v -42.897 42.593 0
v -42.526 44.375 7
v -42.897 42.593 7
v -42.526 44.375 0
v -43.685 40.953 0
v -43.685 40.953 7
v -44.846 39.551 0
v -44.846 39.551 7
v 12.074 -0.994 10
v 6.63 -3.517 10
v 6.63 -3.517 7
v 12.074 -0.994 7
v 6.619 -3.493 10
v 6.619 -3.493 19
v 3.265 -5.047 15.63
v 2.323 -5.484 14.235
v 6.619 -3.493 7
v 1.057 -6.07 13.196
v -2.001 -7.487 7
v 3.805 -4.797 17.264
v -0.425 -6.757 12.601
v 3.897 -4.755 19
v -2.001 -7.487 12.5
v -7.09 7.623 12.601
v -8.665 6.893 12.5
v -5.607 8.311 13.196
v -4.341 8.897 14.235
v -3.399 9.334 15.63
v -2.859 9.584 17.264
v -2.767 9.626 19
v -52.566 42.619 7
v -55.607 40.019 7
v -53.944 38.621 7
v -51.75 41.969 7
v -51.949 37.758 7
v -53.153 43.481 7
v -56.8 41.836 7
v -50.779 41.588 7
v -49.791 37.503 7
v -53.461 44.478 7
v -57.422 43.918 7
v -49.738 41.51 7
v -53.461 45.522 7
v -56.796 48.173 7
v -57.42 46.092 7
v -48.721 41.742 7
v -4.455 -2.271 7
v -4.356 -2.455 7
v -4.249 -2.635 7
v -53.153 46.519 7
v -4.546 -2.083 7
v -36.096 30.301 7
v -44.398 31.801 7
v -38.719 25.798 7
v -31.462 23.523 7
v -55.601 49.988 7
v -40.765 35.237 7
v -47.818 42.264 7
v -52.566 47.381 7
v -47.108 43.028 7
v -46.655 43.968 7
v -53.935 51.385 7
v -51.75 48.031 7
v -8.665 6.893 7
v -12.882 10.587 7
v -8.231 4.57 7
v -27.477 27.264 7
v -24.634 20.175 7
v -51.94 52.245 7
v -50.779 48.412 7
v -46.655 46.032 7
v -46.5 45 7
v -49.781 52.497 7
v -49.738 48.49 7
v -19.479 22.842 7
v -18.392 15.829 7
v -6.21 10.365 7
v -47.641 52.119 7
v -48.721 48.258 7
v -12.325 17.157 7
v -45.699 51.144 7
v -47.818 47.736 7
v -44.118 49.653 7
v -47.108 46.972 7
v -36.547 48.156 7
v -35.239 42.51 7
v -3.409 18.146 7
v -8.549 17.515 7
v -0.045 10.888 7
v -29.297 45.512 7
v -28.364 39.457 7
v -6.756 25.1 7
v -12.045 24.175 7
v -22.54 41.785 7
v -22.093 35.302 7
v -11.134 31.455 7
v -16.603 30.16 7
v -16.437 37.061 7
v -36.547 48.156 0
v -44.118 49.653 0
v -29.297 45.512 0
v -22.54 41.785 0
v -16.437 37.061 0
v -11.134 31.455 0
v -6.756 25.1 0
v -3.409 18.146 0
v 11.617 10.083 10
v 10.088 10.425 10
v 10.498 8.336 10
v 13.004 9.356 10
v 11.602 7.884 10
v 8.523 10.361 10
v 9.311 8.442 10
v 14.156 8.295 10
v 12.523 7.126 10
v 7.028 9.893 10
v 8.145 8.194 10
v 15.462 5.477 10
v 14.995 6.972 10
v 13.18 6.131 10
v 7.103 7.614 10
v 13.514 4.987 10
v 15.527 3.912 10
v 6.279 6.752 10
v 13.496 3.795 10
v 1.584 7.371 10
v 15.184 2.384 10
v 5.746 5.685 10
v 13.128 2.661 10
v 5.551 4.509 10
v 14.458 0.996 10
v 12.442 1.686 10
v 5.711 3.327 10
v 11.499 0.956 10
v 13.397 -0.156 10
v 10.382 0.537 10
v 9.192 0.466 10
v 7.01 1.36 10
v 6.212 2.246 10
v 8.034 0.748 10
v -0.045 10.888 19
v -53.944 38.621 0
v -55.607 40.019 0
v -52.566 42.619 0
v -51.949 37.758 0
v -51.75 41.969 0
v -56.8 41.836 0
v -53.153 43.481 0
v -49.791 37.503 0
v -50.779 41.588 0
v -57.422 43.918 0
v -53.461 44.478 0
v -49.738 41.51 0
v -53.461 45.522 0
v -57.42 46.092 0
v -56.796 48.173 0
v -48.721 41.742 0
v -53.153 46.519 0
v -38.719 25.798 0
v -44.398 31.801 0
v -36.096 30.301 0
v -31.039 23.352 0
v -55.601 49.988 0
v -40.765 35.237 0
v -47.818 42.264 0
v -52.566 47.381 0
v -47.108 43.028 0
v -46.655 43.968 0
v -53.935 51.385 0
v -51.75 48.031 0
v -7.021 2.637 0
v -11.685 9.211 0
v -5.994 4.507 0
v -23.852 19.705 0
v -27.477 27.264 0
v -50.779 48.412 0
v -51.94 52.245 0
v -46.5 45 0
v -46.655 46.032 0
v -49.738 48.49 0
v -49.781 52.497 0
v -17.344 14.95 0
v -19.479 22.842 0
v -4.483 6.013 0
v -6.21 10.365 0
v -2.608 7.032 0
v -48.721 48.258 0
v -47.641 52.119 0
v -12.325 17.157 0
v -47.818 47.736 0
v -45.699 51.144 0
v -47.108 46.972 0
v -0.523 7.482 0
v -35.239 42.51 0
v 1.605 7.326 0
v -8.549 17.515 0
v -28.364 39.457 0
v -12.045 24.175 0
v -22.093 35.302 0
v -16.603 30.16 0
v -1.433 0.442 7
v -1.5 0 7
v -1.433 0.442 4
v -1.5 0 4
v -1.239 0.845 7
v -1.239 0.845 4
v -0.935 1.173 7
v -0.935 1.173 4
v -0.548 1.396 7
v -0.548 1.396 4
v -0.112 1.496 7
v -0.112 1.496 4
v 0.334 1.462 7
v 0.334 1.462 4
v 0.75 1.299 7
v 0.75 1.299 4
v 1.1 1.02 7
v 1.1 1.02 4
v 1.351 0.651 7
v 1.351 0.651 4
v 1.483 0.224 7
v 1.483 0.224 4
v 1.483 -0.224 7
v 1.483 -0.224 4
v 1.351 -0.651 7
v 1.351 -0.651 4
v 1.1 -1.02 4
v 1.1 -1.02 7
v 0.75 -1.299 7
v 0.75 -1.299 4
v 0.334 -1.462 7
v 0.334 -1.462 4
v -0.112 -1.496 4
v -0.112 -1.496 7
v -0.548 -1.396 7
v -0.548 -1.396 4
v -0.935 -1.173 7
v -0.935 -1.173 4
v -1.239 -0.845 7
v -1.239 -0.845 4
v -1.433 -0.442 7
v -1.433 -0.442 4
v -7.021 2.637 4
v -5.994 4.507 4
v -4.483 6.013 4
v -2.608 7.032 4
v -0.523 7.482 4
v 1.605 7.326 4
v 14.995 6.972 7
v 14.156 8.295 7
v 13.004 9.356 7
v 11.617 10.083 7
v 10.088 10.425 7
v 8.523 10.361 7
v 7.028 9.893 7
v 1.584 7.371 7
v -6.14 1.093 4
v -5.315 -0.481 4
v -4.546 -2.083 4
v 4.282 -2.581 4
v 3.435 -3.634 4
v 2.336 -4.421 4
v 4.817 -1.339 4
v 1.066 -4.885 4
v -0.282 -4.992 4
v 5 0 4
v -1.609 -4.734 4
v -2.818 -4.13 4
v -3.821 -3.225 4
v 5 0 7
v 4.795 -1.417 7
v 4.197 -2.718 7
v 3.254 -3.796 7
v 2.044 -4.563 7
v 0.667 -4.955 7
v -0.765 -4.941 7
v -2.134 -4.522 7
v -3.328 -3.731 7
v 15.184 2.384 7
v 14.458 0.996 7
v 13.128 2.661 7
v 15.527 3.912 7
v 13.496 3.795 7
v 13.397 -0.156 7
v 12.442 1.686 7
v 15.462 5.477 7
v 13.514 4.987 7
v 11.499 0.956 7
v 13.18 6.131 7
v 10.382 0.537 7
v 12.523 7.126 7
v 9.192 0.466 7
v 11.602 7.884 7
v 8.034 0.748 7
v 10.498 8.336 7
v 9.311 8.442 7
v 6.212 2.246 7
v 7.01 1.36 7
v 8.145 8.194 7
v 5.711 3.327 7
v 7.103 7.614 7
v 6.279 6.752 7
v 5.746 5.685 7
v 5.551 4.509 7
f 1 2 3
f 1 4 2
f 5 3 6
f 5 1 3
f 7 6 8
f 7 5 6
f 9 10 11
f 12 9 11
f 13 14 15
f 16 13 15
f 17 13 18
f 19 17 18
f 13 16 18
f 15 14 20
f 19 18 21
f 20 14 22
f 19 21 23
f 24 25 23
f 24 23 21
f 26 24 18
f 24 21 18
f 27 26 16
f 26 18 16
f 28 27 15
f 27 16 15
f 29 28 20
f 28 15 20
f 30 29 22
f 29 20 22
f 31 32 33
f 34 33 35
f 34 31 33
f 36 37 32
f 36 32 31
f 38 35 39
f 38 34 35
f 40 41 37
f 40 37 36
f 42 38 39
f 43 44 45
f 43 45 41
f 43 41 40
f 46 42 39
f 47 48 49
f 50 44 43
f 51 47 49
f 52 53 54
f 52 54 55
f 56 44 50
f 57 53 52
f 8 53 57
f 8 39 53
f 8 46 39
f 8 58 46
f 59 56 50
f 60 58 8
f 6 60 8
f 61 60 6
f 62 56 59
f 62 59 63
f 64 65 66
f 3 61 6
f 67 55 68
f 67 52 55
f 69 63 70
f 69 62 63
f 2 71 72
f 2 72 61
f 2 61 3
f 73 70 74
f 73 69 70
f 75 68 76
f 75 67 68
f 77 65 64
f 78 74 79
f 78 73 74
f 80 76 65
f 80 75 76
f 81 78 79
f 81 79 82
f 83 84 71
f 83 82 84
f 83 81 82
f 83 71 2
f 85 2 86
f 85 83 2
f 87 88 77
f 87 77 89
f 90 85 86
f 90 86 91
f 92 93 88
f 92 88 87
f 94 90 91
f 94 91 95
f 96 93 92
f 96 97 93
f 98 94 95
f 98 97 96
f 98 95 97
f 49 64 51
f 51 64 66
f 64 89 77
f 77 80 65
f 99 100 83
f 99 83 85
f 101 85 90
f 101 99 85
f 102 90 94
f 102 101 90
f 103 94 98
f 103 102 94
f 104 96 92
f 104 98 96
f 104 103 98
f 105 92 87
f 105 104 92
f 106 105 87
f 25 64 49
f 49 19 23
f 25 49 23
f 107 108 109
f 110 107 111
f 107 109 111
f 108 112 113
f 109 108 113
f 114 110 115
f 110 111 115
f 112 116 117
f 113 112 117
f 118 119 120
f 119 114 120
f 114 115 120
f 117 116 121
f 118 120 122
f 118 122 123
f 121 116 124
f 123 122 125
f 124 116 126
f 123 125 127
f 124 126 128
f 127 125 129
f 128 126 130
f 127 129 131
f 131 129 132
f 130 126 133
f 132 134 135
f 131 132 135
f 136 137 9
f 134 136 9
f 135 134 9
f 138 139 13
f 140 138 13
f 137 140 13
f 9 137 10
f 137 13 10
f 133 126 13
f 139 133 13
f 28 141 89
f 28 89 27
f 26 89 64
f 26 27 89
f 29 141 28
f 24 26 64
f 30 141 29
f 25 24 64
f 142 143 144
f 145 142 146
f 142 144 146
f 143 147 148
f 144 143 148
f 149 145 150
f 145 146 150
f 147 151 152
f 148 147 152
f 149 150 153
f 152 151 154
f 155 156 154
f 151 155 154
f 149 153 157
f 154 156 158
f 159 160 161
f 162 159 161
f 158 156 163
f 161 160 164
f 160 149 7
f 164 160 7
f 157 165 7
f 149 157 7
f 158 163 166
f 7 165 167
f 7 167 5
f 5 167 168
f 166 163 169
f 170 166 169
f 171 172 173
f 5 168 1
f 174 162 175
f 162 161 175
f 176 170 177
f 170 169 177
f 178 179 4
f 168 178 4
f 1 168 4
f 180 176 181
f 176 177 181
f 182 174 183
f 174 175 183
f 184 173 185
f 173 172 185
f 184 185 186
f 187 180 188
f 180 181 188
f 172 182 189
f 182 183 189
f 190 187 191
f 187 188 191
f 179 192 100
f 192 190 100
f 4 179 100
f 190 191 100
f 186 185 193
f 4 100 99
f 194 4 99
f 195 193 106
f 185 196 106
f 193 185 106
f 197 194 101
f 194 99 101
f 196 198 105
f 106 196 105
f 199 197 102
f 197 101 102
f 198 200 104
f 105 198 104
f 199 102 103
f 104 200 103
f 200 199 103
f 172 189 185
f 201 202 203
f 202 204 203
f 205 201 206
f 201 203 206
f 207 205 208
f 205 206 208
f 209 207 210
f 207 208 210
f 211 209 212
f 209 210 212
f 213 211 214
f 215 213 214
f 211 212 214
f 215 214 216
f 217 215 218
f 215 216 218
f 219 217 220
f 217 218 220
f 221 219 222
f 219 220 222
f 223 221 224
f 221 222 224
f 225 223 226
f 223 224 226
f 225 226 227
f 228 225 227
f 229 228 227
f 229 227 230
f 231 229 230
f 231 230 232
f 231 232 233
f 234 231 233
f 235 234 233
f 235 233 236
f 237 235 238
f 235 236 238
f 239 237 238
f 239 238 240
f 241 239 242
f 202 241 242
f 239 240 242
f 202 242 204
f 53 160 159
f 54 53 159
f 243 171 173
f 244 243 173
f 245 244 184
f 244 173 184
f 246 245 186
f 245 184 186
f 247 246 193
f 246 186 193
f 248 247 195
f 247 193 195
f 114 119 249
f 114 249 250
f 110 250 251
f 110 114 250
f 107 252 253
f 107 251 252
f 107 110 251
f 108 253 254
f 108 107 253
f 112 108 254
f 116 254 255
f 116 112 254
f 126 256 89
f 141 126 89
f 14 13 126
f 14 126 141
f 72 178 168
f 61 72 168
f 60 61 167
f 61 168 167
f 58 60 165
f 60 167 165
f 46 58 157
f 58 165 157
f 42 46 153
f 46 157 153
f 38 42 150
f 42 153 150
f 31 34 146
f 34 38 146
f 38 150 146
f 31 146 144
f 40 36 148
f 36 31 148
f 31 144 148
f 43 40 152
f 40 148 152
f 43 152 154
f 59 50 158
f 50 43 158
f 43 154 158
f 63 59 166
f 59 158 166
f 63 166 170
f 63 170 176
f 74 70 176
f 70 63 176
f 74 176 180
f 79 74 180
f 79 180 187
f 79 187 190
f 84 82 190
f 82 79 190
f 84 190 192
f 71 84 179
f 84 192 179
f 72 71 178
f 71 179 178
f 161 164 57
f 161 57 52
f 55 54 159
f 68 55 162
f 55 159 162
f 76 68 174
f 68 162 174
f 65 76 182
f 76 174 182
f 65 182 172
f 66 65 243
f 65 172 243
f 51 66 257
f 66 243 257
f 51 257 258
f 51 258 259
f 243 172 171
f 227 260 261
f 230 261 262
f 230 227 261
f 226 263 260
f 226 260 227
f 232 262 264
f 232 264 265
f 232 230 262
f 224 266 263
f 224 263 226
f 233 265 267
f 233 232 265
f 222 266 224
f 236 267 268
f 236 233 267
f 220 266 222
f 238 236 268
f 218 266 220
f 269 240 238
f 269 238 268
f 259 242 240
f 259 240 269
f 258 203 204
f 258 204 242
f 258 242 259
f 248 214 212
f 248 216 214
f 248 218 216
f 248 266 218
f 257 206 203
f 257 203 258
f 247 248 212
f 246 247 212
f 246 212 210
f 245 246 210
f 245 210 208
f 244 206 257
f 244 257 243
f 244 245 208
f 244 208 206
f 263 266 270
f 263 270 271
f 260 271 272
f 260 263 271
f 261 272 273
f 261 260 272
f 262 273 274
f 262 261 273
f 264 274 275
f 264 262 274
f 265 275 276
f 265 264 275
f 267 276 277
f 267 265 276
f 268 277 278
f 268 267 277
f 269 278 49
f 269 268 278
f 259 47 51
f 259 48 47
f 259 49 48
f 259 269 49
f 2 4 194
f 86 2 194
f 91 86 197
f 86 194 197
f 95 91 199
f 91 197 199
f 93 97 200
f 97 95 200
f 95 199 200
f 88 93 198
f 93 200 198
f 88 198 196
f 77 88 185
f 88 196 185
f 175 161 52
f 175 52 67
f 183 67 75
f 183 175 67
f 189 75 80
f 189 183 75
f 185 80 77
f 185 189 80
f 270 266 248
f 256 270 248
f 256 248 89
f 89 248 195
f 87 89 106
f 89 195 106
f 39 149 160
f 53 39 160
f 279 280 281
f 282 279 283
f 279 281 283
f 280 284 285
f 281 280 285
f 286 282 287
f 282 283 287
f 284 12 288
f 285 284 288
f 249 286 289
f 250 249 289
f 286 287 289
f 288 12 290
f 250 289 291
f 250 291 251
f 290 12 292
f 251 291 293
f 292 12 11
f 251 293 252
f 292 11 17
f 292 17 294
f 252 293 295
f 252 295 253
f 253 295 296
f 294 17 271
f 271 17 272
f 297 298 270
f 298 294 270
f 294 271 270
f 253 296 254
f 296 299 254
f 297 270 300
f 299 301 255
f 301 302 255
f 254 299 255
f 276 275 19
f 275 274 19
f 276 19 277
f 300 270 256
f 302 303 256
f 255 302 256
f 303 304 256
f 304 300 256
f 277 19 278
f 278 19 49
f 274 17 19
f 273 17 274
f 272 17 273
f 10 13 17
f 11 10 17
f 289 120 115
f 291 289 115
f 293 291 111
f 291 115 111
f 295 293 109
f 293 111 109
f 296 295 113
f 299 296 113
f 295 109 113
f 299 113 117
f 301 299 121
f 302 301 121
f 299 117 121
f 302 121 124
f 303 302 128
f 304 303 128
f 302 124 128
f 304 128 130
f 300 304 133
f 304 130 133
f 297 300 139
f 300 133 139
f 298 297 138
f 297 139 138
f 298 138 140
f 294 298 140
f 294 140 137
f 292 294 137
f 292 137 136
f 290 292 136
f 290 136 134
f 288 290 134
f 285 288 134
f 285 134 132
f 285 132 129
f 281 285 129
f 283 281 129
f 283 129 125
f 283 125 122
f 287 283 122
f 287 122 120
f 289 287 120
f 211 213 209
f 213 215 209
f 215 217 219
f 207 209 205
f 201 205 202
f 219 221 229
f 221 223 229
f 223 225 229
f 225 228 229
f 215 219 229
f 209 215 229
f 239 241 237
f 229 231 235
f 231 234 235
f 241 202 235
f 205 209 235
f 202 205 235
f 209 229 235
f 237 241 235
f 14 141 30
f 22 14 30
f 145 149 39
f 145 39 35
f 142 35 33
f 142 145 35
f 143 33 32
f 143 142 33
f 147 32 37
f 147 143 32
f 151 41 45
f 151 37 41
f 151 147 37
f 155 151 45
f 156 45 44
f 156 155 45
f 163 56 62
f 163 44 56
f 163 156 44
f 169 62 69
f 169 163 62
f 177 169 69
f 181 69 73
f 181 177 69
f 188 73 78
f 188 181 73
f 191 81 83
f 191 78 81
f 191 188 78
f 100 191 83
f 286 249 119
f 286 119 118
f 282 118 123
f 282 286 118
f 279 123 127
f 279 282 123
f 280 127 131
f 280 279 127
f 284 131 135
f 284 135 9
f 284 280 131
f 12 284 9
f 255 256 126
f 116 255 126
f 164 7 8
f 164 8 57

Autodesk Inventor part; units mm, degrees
ref_plane "YZ Plane" through (0, 0, 0) normal (1, 0, 0) x (0, 1, 0)
ref_plane "XZ Plane" through (0, 0, 0) normal (0, 1, 0) x (-1, 0, 0)
sketch "Sketch1" plane through (0, 0, 0) normal (0, 0, 1) x (1, 0, 0)
  arc A0 (-3.4091, 18.1463) -> (-44.1177, 49.6528) centre (-50, 0) ccw
  arc A1 (-4.5455, -2.083) -> (-38.7191, 25.7979) centre (-50, -22.9129) ccw
  arc A2 (-6.2101, 10.3653) -> (-42.5261, 44.375) centre (-50, 0) ccw
  line L0 (5, 0) -> (-3.4091, 18.1463)
  arc A3 (-4.5455, -2.083) -> (5, 0) centre (0, 0) ccw
  line L1 (-50, 32.0871) -> (-50, 50) construction
  line L2 (-50, 37.7239) -> (-44.3975, 31.801)
  line L3 (-44.8461, 39.5514) -> (-40.7651, 35.237)
  line L4 (-44.3975, 31.801) -> (-38.7191, 25.7979)
  line L5 (-40.7651, 35.237) -> (-36.0957, 30.3006)
  arc A4 (-6.2101, 10.3653) -> (-36.0957, 30.3006) centre (-50, -22.9129) ccw
  circle A5 centre (-50, 45) radius 3.5
  arc A6 (-44.8461, 39.5514) -> (-42.5261, 44.375) centre (-50, 45) ccw
  arc A7 (-44.1177, 49.6528) -> (-49.7909, 37.5029) centre (-50, 45) ccw
  point P0 (19.05, 139.7)
  dimension "d65" = 5
  dimension "d66" = 20
  dimension "d74" = 5
  dimension "d75" = 7
extrude "Extrusion12" add sketch "Sketch1" along normal blind 7
sketch "Sketch16" plane through (0, 0, 7) normal (0, 0, 1) x (1, 0, 0)
  point P0 (0, 0)
sketch "Sketch19" plane through (0, 0, 0) normal (0, 0, -1) x (-1, 0, 0)
  circle A0 centre (0, 0) radius 1.5
  dimension "d101" = 3
extrude "Extrusion16" cut sketch "Sketch19" against normal blind 10
sketch "Sketch24" plane through (0, 0, 0) normal (0, 0, -1) x (-1, 0, 0)
  circle A0 centre (0, 0) radius 1.5 projected
  circle A1 centre (0, 0) radius 7.5
  dimension "d115" = 15
extrude "Extrusion19" cut sketch "Sketch24" against normal blind 4
ref_plane "Work Plane9" through (5, 0, 7) normal (-0.4204545, 0.9073136, 0) x (-0.9073136, -0.4204545, 0)
sketch "Sketch25" plane through (0, 0, 7) normal (0, 0, 1) x (1, 0, 0)
  point P0 (0, 0)
sketch "Sketch26" plane through (5, 0, 7) normal (-0.4204545, 0.9073136, 0) x (-0.9073136, -0.4204545, 0)
  point P0 (4.5366, -7)
sketch "Sketch27" plane through (5, 0, 7) normal (-0.4204545, 0.9073136, 0) x (-0.9073136, -0.4204545, 0)
  line L0 (0, -7) -> (0, 0) projected
  line L1 (0, 0) -> (0, 12)
  line L2 (0, 12) -> (3, 12)
  line L3 (0, 0) -> (9.5, 0)
  line L4 (24.5467, 0) -> (5.8129, 0) projected
  line L5 (9.5, 0) -> (9.5, 5.5)
  arc A0 (3, 12) -> (9.5, 5.5) centre (8.9772, 11.4772) ccw
  point P0 (4.5366, -7)
  dimension "d118" = 12
  dimension "d119" = 3
  dimension "d120" = 9.5
  dimension "d121" = 5.5
  dimension "d122" = 6
extrude "Extrusion20" add sketch "Sketch27" along normal blind 12 and the other way blind 3.85
sketch "Sketch30" plane through (0, 0, 4) normal (0, 0, -1) x (-1, 0, 0)
  line L0 (0, 0) -> (-4.9989, 2.3165)
  line L1 (-5, 0) -> (-1.605, 7.3263) projected
sketch "Sketch31" plane through (-3.4091, 18.1463, 7) normal (0.9073136, 0.4204545, 0) x (0, 0, -1)
  line L0 (-15.8, -20) -> (10.8, -20) projected
  line L1 (3, -17.8765) -> (3, -12.5529) projected
  line L2 (3, -17.8765) -> (3, -11.8765)
  line L3 (3, -11.8765) -> (0, -11.8765)
  line L4 (3, -17.8765) -> (0, -17.8765) projected
  line L5 (3, -17.8765) -> (3, -23.8765)
  line L6 (3, -17.8765) -> (3, -22.8977) projected
  line L7 (0, -11.8765) -> (-3, -11.8765)
  line L8 (-3, -11.8765) -> (-3, -23.8765)
  line L9 (-3, -23.8765) -> (0, -23.8765)
  line L10 (0, -23.8765) -> (0, -11.8765)
  point P0 (7, -17.8977)
  point P1 (3, -20)
  dimension "d129" = 6
  dimension "d130" = 3
  dimension "d131" = 6
  dimension "d132" = 3
extrude "Extrusion21" add sketch "Sketch31" along normal blind 12 contours L8 L7 L10 L0 | L0 L10 L9 L8
sketch "Sketch32" plane through (6.6188, -3.4932, 10) normal (0, 0, 1) x (0.9073136, 0.4204545, 0)
  line L0 (0, 11.9735) -> (0, 3.85) projected
  line L1 (0, 6.0521) -> (5.9995, 5.974) construction
  circle A0 centre (5.9995, 5.974) radius 4
  line L2 (6, 11.9735) -> (6, -0.0265) construction
  arc A1 (0, 6.0005) -> (0, 5.9475) centre (5.9995, 5.974) ccw
  line L3 (6, -0.0265) -> (12, -0.0265)
  point P0 (-4.5366, 5.9523)
  point P1 (12, 11.9735)
  dimension "d139" = 6
  dimension "d140" = 8
extrude "Extrusion22" cut sketch "Sketch32" against normal blind 3
fillet "Fillet5" radius 6 2 edges at (12.4722, 12.416, 8.5) (17.5177, 1.5283, 8.5)
properties part number "Beta_arm"
